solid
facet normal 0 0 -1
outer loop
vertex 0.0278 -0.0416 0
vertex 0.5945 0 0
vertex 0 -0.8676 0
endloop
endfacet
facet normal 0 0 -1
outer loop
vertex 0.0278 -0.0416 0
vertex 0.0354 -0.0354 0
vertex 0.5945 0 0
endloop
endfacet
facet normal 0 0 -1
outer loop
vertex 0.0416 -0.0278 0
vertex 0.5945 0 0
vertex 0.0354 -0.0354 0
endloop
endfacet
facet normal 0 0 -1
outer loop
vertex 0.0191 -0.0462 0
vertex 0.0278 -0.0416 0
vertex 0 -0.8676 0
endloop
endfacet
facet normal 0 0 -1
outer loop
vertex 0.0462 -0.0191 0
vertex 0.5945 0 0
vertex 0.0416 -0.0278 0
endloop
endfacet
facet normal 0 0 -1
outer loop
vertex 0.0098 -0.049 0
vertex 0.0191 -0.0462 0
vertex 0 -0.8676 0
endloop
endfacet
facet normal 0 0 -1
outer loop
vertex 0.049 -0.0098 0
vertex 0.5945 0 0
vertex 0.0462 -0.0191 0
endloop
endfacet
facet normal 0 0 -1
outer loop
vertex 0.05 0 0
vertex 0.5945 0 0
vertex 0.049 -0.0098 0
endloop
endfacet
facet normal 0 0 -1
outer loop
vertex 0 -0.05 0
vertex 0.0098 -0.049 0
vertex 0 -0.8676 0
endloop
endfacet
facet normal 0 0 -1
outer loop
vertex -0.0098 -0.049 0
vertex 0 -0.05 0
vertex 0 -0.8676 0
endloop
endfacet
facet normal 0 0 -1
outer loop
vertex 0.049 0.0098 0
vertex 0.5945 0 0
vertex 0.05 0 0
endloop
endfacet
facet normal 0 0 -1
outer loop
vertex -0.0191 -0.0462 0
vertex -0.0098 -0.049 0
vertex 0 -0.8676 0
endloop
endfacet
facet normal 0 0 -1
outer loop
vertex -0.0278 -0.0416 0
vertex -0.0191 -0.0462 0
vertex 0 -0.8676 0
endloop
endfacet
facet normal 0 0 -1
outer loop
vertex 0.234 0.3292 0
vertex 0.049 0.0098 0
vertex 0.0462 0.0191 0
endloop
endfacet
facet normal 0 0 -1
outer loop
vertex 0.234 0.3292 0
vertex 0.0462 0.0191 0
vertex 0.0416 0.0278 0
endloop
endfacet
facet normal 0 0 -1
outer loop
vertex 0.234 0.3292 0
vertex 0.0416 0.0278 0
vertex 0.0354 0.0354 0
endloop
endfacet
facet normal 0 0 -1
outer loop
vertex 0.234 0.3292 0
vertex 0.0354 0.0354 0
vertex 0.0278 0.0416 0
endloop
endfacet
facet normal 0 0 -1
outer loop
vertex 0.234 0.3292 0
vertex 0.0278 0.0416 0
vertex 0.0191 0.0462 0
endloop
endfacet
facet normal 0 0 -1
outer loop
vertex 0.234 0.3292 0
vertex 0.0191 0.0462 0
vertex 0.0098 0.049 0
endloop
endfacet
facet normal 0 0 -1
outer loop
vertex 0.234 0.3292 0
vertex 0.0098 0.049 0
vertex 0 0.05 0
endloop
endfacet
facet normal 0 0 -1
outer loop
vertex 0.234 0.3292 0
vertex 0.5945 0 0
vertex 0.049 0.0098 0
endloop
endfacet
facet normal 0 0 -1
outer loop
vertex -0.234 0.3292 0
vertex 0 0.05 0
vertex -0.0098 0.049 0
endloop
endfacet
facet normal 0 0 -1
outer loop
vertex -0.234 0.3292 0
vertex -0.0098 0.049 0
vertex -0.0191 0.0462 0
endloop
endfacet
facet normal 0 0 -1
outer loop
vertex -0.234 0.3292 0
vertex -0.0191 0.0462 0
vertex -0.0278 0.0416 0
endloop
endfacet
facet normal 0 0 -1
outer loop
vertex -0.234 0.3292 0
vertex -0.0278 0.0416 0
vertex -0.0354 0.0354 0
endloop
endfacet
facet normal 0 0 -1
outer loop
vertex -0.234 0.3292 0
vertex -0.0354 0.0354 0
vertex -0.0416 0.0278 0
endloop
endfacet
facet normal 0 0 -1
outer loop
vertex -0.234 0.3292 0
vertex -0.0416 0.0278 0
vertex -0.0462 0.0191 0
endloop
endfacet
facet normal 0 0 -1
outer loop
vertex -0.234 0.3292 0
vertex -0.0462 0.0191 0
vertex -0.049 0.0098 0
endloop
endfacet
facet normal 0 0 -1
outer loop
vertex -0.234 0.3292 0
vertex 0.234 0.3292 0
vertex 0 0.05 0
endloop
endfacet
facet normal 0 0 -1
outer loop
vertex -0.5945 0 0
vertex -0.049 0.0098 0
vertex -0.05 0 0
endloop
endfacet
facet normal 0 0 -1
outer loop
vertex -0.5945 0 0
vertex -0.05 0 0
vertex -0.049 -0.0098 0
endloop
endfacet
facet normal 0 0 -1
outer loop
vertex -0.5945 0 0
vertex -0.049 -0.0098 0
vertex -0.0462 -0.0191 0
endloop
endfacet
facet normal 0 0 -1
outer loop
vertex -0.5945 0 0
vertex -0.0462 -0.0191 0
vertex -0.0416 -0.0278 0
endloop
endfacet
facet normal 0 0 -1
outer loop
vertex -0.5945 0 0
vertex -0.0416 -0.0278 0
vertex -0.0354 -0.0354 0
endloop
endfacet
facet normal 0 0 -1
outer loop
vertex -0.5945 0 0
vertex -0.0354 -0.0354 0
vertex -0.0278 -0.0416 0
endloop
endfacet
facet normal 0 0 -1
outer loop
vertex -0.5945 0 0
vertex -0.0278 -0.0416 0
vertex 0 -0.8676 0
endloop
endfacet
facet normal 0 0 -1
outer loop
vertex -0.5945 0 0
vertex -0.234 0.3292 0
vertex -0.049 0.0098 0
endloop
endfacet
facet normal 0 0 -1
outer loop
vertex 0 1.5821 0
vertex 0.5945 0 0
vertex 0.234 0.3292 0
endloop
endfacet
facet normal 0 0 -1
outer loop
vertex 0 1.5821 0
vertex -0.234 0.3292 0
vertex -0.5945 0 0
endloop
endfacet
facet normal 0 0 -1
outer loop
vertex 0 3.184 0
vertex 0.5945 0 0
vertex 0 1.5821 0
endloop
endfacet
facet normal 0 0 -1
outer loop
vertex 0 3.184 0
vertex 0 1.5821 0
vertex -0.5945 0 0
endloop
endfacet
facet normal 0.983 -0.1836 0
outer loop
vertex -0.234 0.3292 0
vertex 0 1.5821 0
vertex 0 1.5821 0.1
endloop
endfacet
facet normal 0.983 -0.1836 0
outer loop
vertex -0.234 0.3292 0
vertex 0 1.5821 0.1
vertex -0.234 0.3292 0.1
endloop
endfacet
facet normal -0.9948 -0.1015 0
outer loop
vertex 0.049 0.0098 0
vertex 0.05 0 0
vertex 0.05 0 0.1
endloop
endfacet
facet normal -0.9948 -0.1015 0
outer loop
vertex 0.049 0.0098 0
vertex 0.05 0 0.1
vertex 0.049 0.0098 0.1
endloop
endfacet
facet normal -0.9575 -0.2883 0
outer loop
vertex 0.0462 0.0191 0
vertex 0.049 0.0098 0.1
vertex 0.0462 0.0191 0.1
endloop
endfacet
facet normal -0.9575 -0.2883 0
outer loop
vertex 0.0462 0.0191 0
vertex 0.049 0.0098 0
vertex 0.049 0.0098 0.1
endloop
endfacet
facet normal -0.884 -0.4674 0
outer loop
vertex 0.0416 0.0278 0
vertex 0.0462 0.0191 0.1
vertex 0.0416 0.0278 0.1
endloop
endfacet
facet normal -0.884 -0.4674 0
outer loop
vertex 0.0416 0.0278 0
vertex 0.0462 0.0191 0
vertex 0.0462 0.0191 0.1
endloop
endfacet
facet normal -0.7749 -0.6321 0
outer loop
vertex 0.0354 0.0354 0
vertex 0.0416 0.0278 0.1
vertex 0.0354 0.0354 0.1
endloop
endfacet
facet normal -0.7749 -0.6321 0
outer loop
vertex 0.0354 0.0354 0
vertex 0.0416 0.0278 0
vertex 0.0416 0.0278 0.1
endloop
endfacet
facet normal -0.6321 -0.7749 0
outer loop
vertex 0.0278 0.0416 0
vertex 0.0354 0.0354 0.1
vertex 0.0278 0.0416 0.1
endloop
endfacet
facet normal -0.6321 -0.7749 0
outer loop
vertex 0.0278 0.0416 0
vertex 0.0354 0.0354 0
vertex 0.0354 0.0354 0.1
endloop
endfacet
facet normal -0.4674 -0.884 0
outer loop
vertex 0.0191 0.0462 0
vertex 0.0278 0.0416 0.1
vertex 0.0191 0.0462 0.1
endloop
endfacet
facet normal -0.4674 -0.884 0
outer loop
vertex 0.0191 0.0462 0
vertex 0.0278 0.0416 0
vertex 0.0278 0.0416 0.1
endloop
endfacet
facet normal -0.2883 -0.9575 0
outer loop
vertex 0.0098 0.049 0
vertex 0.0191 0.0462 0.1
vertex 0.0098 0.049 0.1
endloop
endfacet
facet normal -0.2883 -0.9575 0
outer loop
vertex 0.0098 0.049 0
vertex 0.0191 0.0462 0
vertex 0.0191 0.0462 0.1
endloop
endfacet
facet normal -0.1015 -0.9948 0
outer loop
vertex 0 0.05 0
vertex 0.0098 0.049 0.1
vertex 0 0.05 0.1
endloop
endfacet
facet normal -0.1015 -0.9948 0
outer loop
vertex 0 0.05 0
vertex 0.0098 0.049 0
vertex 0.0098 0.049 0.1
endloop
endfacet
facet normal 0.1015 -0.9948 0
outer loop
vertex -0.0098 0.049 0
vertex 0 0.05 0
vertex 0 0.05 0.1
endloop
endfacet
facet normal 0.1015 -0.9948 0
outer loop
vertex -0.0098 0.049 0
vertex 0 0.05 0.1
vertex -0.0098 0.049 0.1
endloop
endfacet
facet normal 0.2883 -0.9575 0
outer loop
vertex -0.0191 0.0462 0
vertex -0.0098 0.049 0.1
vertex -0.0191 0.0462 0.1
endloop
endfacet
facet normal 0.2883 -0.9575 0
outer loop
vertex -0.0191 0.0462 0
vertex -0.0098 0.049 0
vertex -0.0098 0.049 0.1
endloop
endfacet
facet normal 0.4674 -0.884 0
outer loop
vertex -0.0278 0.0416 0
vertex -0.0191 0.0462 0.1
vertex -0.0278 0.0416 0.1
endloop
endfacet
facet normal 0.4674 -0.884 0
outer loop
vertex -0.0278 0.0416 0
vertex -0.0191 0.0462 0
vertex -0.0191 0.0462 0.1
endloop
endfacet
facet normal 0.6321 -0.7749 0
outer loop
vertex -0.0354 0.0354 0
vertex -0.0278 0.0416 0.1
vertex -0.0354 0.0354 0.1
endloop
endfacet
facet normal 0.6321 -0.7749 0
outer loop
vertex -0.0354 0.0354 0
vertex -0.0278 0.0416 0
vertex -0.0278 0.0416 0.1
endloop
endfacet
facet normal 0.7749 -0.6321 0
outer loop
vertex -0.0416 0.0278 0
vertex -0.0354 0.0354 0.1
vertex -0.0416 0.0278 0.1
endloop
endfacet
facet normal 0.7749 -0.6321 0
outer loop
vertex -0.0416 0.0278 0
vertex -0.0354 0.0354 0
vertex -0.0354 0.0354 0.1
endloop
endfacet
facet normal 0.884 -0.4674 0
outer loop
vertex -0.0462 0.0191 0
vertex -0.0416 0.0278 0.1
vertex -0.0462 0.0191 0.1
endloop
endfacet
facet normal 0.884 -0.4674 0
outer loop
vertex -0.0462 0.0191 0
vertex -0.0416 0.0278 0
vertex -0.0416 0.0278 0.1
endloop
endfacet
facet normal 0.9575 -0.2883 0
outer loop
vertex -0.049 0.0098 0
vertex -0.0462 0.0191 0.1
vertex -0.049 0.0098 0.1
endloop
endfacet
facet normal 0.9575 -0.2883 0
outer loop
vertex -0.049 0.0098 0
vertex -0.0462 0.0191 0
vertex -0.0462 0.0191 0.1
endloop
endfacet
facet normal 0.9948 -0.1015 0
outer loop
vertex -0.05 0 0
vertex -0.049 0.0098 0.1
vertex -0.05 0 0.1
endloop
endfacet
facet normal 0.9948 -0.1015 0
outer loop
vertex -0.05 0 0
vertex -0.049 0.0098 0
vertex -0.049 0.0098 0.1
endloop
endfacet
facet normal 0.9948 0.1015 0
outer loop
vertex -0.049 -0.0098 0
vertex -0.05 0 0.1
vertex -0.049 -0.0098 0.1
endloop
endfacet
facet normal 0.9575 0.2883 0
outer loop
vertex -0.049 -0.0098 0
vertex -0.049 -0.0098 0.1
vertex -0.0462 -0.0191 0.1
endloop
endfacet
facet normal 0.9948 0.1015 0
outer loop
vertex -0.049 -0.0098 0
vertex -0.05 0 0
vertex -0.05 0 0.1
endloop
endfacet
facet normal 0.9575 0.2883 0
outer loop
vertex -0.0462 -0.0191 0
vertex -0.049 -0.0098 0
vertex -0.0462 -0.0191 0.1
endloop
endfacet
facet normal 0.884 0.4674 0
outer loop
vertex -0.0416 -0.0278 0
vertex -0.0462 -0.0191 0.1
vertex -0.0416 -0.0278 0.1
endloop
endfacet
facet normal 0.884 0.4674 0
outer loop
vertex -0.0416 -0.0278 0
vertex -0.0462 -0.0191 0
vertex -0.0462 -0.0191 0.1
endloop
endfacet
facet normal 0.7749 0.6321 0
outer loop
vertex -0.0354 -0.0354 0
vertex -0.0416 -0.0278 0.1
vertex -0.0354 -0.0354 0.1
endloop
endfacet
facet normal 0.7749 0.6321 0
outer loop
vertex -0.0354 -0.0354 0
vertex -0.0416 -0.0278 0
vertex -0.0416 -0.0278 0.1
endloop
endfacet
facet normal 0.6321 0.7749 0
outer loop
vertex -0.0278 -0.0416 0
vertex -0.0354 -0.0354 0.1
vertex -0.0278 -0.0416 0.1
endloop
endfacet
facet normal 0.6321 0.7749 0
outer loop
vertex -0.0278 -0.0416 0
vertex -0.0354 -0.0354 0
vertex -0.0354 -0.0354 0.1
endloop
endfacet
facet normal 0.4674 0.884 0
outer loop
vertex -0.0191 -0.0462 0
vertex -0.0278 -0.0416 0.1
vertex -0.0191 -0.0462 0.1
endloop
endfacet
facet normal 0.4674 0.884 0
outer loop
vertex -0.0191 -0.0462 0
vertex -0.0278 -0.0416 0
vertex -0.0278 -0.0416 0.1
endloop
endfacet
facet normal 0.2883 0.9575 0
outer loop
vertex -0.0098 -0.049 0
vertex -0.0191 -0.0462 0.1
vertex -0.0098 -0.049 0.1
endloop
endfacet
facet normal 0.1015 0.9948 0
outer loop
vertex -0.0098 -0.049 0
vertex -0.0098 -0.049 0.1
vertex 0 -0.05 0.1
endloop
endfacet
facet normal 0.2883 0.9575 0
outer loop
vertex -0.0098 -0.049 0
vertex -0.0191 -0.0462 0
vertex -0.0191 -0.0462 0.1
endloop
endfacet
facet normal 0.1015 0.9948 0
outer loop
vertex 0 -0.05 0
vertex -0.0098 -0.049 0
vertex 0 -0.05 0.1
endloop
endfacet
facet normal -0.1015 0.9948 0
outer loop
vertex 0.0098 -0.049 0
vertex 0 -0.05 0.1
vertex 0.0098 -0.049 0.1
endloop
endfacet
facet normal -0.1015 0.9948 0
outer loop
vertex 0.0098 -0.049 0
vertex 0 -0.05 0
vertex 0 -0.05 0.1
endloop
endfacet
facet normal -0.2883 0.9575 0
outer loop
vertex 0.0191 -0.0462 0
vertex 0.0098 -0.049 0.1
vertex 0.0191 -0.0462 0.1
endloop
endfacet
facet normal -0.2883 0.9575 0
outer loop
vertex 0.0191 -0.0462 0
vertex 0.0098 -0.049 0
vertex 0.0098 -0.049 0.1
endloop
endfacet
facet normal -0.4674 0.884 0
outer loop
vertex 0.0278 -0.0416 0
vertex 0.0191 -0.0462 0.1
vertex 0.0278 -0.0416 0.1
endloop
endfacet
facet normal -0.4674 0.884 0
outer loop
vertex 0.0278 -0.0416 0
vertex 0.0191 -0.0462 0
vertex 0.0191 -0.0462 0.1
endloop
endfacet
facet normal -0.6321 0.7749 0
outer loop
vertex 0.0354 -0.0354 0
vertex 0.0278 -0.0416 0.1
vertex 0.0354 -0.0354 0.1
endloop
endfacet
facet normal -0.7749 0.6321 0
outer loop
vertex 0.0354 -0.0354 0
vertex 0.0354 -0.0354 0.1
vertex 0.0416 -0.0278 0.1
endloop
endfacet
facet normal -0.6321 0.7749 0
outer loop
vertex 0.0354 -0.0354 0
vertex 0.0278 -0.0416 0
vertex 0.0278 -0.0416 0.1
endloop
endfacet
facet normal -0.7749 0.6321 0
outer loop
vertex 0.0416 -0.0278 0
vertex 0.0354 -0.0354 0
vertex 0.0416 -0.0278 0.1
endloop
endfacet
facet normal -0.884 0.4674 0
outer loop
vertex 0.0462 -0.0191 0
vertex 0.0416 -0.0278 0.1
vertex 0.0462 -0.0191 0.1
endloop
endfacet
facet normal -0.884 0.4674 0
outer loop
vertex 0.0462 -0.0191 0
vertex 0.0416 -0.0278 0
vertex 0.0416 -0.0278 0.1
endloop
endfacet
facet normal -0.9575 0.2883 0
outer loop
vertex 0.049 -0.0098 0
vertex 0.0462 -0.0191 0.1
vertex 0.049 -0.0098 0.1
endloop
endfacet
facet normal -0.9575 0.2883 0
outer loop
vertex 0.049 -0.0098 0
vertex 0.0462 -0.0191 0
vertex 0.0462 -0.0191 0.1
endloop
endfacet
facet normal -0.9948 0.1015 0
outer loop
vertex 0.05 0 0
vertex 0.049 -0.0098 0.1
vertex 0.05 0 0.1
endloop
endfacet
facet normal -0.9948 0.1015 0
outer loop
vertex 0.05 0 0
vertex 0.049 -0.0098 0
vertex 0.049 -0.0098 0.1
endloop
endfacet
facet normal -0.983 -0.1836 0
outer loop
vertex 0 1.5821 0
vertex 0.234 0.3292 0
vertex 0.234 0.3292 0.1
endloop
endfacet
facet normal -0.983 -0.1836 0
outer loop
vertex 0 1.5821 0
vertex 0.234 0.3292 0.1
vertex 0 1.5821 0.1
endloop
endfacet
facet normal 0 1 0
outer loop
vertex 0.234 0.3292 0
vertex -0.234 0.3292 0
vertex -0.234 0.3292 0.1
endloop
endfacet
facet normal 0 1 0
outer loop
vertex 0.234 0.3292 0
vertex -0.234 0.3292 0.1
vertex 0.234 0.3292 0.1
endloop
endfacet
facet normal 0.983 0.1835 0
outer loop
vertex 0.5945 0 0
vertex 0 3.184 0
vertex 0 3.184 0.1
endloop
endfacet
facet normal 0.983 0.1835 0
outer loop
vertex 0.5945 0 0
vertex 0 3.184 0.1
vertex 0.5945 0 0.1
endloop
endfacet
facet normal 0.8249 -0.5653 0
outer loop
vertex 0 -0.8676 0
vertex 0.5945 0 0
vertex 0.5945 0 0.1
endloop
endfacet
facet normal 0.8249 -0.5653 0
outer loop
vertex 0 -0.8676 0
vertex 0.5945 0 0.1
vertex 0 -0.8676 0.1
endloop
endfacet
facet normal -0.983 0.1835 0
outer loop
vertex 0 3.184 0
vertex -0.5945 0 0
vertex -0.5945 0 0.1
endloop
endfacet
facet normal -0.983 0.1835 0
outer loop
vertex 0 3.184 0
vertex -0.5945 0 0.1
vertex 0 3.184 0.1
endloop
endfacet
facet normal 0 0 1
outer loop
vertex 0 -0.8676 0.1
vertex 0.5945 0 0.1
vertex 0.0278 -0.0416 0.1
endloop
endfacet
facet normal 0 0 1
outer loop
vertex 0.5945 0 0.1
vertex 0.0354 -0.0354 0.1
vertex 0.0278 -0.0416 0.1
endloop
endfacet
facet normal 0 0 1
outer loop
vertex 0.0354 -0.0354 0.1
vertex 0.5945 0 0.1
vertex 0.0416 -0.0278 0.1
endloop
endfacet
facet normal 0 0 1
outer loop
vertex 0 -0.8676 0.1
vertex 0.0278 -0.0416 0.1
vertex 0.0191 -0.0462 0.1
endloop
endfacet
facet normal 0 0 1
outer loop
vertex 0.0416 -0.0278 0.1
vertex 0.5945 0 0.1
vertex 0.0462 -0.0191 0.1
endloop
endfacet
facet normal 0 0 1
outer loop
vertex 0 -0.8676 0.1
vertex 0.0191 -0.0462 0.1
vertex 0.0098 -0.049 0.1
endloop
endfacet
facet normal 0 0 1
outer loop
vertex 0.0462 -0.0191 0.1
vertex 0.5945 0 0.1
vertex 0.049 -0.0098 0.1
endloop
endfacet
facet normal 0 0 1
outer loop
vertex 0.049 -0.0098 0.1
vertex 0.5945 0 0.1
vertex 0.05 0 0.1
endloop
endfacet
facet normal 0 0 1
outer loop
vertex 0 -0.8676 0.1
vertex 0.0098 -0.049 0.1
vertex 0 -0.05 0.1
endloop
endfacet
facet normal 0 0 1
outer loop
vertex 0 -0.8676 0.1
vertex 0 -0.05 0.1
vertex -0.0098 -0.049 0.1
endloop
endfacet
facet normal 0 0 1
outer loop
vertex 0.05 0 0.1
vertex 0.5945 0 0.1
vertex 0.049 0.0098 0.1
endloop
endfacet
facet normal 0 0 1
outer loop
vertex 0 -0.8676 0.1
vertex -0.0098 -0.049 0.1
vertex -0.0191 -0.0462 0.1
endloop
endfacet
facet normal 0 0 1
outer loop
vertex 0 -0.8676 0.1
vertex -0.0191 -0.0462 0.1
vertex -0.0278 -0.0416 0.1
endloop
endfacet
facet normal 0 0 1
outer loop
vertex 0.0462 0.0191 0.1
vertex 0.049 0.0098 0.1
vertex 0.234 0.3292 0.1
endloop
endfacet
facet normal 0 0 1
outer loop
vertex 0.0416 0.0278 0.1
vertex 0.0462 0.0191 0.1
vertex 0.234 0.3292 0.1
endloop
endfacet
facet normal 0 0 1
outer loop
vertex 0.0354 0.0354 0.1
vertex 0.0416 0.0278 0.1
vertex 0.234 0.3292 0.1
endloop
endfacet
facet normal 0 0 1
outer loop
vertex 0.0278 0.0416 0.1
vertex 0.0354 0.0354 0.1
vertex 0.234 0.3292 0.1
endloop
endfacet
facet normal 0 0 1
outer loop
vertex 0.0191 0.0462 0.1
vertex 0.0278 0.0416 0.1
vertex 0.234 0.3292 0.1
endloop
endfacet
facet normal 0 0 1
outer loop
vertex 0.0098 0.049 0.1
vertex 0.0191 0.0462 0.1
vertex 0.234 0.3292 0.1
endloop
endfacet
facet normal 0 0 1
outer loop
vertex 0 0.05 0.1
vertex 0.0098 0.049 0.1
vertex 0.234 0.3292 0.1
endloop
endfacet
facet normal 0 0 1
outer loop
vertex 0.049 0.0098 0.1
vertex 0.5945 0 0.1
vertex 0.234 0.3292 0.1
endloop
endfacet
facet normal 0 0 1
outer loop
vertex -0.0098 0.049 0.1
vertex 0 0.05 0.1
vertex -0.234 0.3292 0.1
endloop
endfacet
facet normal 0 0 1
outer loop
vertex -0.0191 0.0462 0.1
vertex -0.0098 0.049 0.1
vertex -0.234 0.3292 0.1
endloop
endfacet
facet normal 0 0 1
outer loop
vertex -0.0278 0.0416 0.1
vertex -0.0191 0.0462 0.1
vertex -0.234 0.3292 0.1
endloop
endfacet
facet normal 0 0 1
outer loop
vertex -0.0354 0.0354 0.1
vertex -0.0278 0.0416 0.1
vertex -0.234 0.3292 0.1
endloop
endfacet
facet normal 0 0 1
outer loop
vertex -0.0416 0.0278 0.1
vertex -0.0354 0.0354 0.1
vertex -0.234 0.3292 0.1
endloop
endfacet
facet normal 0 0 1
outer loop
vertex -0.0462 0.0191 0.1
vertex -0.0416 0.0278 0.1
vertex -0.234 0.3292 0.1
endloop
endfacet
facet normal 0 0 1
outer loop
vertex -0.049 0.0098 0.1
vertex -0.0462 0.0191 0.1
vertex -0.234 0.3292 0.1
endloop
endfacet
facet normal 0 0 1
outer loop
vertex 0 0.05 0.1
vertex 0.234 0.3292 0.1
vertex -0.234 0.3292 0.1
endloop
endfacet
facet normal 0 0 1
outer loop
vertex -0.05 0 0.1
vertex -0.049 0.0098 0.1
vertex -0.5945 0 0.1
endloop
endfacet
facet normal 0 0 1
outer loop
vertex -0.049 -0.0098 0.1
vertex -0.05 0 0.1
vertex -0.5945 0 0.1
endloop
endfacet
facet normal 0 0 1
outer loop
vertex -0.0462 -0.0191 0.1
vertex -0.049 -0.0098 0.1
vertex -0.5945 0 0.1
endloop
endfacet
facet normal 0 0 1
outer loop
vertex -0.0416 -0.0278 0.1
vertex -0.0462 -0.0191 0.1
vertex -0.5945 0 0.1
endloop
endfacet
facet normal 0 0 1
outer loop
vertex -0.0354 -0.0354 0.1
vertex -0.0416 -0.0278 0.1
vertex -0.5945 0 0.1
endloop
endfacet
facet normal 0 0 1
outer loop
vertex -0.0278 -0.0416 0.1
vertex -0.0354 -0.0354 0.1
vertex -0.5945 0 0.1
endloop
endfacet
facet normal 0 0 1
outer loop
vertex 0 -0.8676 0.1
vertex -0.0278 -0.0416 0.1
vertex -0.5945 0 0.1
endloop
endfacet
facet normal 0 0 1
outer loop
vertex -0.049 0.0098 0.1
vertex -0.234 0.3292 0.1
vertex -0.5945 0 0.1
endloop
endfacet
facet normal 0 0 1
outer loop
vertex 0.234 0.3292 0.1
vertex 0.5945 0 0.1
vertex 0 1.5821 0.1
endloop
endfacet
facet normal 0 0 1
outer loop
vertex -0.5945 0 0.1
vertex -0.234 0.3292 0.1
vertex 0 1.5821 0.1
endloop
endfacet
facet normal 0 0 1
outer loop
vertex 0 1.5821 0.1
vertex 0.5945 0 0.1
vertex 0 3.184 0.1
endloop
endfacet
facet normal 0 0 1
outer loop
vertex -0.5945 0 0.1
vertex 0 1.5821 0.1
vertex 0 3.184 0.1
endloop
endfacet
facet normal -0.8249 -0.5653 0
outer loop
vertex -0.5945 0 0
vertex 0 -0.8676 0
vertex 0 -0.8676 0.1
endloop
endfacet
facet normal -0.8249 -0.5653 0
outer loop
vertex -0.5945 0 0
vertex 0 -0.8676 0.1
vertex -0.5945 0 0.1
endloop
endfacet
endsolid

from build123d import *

# Parameters (mm, degrees)
SKETCH1_R           = 0.05
BOSS_EXTRUDE1_DEPTH = 0.1


with BuildPart() as part:
    # Sketch1 → Boss-Extrude1 (new body)
    with BuildSketch(Plane.XY):
        Polygon((0, 3.1840221), (0.594549459, 0), (0, -0.867569573), (-0.594549459, 0), align=None)
        Circle(SKETCH1_R, mode=Mode.SUBTRACT)
        Polygon((-0.233954096, 0.329177116), (0.233954096, 0.329177116), (0, 1.582083838), align=None, mode=Mode.SUBTRACT)
    extrude(amount=BOSS_EXTRUDE1_DEPTH)


solid = part.part
